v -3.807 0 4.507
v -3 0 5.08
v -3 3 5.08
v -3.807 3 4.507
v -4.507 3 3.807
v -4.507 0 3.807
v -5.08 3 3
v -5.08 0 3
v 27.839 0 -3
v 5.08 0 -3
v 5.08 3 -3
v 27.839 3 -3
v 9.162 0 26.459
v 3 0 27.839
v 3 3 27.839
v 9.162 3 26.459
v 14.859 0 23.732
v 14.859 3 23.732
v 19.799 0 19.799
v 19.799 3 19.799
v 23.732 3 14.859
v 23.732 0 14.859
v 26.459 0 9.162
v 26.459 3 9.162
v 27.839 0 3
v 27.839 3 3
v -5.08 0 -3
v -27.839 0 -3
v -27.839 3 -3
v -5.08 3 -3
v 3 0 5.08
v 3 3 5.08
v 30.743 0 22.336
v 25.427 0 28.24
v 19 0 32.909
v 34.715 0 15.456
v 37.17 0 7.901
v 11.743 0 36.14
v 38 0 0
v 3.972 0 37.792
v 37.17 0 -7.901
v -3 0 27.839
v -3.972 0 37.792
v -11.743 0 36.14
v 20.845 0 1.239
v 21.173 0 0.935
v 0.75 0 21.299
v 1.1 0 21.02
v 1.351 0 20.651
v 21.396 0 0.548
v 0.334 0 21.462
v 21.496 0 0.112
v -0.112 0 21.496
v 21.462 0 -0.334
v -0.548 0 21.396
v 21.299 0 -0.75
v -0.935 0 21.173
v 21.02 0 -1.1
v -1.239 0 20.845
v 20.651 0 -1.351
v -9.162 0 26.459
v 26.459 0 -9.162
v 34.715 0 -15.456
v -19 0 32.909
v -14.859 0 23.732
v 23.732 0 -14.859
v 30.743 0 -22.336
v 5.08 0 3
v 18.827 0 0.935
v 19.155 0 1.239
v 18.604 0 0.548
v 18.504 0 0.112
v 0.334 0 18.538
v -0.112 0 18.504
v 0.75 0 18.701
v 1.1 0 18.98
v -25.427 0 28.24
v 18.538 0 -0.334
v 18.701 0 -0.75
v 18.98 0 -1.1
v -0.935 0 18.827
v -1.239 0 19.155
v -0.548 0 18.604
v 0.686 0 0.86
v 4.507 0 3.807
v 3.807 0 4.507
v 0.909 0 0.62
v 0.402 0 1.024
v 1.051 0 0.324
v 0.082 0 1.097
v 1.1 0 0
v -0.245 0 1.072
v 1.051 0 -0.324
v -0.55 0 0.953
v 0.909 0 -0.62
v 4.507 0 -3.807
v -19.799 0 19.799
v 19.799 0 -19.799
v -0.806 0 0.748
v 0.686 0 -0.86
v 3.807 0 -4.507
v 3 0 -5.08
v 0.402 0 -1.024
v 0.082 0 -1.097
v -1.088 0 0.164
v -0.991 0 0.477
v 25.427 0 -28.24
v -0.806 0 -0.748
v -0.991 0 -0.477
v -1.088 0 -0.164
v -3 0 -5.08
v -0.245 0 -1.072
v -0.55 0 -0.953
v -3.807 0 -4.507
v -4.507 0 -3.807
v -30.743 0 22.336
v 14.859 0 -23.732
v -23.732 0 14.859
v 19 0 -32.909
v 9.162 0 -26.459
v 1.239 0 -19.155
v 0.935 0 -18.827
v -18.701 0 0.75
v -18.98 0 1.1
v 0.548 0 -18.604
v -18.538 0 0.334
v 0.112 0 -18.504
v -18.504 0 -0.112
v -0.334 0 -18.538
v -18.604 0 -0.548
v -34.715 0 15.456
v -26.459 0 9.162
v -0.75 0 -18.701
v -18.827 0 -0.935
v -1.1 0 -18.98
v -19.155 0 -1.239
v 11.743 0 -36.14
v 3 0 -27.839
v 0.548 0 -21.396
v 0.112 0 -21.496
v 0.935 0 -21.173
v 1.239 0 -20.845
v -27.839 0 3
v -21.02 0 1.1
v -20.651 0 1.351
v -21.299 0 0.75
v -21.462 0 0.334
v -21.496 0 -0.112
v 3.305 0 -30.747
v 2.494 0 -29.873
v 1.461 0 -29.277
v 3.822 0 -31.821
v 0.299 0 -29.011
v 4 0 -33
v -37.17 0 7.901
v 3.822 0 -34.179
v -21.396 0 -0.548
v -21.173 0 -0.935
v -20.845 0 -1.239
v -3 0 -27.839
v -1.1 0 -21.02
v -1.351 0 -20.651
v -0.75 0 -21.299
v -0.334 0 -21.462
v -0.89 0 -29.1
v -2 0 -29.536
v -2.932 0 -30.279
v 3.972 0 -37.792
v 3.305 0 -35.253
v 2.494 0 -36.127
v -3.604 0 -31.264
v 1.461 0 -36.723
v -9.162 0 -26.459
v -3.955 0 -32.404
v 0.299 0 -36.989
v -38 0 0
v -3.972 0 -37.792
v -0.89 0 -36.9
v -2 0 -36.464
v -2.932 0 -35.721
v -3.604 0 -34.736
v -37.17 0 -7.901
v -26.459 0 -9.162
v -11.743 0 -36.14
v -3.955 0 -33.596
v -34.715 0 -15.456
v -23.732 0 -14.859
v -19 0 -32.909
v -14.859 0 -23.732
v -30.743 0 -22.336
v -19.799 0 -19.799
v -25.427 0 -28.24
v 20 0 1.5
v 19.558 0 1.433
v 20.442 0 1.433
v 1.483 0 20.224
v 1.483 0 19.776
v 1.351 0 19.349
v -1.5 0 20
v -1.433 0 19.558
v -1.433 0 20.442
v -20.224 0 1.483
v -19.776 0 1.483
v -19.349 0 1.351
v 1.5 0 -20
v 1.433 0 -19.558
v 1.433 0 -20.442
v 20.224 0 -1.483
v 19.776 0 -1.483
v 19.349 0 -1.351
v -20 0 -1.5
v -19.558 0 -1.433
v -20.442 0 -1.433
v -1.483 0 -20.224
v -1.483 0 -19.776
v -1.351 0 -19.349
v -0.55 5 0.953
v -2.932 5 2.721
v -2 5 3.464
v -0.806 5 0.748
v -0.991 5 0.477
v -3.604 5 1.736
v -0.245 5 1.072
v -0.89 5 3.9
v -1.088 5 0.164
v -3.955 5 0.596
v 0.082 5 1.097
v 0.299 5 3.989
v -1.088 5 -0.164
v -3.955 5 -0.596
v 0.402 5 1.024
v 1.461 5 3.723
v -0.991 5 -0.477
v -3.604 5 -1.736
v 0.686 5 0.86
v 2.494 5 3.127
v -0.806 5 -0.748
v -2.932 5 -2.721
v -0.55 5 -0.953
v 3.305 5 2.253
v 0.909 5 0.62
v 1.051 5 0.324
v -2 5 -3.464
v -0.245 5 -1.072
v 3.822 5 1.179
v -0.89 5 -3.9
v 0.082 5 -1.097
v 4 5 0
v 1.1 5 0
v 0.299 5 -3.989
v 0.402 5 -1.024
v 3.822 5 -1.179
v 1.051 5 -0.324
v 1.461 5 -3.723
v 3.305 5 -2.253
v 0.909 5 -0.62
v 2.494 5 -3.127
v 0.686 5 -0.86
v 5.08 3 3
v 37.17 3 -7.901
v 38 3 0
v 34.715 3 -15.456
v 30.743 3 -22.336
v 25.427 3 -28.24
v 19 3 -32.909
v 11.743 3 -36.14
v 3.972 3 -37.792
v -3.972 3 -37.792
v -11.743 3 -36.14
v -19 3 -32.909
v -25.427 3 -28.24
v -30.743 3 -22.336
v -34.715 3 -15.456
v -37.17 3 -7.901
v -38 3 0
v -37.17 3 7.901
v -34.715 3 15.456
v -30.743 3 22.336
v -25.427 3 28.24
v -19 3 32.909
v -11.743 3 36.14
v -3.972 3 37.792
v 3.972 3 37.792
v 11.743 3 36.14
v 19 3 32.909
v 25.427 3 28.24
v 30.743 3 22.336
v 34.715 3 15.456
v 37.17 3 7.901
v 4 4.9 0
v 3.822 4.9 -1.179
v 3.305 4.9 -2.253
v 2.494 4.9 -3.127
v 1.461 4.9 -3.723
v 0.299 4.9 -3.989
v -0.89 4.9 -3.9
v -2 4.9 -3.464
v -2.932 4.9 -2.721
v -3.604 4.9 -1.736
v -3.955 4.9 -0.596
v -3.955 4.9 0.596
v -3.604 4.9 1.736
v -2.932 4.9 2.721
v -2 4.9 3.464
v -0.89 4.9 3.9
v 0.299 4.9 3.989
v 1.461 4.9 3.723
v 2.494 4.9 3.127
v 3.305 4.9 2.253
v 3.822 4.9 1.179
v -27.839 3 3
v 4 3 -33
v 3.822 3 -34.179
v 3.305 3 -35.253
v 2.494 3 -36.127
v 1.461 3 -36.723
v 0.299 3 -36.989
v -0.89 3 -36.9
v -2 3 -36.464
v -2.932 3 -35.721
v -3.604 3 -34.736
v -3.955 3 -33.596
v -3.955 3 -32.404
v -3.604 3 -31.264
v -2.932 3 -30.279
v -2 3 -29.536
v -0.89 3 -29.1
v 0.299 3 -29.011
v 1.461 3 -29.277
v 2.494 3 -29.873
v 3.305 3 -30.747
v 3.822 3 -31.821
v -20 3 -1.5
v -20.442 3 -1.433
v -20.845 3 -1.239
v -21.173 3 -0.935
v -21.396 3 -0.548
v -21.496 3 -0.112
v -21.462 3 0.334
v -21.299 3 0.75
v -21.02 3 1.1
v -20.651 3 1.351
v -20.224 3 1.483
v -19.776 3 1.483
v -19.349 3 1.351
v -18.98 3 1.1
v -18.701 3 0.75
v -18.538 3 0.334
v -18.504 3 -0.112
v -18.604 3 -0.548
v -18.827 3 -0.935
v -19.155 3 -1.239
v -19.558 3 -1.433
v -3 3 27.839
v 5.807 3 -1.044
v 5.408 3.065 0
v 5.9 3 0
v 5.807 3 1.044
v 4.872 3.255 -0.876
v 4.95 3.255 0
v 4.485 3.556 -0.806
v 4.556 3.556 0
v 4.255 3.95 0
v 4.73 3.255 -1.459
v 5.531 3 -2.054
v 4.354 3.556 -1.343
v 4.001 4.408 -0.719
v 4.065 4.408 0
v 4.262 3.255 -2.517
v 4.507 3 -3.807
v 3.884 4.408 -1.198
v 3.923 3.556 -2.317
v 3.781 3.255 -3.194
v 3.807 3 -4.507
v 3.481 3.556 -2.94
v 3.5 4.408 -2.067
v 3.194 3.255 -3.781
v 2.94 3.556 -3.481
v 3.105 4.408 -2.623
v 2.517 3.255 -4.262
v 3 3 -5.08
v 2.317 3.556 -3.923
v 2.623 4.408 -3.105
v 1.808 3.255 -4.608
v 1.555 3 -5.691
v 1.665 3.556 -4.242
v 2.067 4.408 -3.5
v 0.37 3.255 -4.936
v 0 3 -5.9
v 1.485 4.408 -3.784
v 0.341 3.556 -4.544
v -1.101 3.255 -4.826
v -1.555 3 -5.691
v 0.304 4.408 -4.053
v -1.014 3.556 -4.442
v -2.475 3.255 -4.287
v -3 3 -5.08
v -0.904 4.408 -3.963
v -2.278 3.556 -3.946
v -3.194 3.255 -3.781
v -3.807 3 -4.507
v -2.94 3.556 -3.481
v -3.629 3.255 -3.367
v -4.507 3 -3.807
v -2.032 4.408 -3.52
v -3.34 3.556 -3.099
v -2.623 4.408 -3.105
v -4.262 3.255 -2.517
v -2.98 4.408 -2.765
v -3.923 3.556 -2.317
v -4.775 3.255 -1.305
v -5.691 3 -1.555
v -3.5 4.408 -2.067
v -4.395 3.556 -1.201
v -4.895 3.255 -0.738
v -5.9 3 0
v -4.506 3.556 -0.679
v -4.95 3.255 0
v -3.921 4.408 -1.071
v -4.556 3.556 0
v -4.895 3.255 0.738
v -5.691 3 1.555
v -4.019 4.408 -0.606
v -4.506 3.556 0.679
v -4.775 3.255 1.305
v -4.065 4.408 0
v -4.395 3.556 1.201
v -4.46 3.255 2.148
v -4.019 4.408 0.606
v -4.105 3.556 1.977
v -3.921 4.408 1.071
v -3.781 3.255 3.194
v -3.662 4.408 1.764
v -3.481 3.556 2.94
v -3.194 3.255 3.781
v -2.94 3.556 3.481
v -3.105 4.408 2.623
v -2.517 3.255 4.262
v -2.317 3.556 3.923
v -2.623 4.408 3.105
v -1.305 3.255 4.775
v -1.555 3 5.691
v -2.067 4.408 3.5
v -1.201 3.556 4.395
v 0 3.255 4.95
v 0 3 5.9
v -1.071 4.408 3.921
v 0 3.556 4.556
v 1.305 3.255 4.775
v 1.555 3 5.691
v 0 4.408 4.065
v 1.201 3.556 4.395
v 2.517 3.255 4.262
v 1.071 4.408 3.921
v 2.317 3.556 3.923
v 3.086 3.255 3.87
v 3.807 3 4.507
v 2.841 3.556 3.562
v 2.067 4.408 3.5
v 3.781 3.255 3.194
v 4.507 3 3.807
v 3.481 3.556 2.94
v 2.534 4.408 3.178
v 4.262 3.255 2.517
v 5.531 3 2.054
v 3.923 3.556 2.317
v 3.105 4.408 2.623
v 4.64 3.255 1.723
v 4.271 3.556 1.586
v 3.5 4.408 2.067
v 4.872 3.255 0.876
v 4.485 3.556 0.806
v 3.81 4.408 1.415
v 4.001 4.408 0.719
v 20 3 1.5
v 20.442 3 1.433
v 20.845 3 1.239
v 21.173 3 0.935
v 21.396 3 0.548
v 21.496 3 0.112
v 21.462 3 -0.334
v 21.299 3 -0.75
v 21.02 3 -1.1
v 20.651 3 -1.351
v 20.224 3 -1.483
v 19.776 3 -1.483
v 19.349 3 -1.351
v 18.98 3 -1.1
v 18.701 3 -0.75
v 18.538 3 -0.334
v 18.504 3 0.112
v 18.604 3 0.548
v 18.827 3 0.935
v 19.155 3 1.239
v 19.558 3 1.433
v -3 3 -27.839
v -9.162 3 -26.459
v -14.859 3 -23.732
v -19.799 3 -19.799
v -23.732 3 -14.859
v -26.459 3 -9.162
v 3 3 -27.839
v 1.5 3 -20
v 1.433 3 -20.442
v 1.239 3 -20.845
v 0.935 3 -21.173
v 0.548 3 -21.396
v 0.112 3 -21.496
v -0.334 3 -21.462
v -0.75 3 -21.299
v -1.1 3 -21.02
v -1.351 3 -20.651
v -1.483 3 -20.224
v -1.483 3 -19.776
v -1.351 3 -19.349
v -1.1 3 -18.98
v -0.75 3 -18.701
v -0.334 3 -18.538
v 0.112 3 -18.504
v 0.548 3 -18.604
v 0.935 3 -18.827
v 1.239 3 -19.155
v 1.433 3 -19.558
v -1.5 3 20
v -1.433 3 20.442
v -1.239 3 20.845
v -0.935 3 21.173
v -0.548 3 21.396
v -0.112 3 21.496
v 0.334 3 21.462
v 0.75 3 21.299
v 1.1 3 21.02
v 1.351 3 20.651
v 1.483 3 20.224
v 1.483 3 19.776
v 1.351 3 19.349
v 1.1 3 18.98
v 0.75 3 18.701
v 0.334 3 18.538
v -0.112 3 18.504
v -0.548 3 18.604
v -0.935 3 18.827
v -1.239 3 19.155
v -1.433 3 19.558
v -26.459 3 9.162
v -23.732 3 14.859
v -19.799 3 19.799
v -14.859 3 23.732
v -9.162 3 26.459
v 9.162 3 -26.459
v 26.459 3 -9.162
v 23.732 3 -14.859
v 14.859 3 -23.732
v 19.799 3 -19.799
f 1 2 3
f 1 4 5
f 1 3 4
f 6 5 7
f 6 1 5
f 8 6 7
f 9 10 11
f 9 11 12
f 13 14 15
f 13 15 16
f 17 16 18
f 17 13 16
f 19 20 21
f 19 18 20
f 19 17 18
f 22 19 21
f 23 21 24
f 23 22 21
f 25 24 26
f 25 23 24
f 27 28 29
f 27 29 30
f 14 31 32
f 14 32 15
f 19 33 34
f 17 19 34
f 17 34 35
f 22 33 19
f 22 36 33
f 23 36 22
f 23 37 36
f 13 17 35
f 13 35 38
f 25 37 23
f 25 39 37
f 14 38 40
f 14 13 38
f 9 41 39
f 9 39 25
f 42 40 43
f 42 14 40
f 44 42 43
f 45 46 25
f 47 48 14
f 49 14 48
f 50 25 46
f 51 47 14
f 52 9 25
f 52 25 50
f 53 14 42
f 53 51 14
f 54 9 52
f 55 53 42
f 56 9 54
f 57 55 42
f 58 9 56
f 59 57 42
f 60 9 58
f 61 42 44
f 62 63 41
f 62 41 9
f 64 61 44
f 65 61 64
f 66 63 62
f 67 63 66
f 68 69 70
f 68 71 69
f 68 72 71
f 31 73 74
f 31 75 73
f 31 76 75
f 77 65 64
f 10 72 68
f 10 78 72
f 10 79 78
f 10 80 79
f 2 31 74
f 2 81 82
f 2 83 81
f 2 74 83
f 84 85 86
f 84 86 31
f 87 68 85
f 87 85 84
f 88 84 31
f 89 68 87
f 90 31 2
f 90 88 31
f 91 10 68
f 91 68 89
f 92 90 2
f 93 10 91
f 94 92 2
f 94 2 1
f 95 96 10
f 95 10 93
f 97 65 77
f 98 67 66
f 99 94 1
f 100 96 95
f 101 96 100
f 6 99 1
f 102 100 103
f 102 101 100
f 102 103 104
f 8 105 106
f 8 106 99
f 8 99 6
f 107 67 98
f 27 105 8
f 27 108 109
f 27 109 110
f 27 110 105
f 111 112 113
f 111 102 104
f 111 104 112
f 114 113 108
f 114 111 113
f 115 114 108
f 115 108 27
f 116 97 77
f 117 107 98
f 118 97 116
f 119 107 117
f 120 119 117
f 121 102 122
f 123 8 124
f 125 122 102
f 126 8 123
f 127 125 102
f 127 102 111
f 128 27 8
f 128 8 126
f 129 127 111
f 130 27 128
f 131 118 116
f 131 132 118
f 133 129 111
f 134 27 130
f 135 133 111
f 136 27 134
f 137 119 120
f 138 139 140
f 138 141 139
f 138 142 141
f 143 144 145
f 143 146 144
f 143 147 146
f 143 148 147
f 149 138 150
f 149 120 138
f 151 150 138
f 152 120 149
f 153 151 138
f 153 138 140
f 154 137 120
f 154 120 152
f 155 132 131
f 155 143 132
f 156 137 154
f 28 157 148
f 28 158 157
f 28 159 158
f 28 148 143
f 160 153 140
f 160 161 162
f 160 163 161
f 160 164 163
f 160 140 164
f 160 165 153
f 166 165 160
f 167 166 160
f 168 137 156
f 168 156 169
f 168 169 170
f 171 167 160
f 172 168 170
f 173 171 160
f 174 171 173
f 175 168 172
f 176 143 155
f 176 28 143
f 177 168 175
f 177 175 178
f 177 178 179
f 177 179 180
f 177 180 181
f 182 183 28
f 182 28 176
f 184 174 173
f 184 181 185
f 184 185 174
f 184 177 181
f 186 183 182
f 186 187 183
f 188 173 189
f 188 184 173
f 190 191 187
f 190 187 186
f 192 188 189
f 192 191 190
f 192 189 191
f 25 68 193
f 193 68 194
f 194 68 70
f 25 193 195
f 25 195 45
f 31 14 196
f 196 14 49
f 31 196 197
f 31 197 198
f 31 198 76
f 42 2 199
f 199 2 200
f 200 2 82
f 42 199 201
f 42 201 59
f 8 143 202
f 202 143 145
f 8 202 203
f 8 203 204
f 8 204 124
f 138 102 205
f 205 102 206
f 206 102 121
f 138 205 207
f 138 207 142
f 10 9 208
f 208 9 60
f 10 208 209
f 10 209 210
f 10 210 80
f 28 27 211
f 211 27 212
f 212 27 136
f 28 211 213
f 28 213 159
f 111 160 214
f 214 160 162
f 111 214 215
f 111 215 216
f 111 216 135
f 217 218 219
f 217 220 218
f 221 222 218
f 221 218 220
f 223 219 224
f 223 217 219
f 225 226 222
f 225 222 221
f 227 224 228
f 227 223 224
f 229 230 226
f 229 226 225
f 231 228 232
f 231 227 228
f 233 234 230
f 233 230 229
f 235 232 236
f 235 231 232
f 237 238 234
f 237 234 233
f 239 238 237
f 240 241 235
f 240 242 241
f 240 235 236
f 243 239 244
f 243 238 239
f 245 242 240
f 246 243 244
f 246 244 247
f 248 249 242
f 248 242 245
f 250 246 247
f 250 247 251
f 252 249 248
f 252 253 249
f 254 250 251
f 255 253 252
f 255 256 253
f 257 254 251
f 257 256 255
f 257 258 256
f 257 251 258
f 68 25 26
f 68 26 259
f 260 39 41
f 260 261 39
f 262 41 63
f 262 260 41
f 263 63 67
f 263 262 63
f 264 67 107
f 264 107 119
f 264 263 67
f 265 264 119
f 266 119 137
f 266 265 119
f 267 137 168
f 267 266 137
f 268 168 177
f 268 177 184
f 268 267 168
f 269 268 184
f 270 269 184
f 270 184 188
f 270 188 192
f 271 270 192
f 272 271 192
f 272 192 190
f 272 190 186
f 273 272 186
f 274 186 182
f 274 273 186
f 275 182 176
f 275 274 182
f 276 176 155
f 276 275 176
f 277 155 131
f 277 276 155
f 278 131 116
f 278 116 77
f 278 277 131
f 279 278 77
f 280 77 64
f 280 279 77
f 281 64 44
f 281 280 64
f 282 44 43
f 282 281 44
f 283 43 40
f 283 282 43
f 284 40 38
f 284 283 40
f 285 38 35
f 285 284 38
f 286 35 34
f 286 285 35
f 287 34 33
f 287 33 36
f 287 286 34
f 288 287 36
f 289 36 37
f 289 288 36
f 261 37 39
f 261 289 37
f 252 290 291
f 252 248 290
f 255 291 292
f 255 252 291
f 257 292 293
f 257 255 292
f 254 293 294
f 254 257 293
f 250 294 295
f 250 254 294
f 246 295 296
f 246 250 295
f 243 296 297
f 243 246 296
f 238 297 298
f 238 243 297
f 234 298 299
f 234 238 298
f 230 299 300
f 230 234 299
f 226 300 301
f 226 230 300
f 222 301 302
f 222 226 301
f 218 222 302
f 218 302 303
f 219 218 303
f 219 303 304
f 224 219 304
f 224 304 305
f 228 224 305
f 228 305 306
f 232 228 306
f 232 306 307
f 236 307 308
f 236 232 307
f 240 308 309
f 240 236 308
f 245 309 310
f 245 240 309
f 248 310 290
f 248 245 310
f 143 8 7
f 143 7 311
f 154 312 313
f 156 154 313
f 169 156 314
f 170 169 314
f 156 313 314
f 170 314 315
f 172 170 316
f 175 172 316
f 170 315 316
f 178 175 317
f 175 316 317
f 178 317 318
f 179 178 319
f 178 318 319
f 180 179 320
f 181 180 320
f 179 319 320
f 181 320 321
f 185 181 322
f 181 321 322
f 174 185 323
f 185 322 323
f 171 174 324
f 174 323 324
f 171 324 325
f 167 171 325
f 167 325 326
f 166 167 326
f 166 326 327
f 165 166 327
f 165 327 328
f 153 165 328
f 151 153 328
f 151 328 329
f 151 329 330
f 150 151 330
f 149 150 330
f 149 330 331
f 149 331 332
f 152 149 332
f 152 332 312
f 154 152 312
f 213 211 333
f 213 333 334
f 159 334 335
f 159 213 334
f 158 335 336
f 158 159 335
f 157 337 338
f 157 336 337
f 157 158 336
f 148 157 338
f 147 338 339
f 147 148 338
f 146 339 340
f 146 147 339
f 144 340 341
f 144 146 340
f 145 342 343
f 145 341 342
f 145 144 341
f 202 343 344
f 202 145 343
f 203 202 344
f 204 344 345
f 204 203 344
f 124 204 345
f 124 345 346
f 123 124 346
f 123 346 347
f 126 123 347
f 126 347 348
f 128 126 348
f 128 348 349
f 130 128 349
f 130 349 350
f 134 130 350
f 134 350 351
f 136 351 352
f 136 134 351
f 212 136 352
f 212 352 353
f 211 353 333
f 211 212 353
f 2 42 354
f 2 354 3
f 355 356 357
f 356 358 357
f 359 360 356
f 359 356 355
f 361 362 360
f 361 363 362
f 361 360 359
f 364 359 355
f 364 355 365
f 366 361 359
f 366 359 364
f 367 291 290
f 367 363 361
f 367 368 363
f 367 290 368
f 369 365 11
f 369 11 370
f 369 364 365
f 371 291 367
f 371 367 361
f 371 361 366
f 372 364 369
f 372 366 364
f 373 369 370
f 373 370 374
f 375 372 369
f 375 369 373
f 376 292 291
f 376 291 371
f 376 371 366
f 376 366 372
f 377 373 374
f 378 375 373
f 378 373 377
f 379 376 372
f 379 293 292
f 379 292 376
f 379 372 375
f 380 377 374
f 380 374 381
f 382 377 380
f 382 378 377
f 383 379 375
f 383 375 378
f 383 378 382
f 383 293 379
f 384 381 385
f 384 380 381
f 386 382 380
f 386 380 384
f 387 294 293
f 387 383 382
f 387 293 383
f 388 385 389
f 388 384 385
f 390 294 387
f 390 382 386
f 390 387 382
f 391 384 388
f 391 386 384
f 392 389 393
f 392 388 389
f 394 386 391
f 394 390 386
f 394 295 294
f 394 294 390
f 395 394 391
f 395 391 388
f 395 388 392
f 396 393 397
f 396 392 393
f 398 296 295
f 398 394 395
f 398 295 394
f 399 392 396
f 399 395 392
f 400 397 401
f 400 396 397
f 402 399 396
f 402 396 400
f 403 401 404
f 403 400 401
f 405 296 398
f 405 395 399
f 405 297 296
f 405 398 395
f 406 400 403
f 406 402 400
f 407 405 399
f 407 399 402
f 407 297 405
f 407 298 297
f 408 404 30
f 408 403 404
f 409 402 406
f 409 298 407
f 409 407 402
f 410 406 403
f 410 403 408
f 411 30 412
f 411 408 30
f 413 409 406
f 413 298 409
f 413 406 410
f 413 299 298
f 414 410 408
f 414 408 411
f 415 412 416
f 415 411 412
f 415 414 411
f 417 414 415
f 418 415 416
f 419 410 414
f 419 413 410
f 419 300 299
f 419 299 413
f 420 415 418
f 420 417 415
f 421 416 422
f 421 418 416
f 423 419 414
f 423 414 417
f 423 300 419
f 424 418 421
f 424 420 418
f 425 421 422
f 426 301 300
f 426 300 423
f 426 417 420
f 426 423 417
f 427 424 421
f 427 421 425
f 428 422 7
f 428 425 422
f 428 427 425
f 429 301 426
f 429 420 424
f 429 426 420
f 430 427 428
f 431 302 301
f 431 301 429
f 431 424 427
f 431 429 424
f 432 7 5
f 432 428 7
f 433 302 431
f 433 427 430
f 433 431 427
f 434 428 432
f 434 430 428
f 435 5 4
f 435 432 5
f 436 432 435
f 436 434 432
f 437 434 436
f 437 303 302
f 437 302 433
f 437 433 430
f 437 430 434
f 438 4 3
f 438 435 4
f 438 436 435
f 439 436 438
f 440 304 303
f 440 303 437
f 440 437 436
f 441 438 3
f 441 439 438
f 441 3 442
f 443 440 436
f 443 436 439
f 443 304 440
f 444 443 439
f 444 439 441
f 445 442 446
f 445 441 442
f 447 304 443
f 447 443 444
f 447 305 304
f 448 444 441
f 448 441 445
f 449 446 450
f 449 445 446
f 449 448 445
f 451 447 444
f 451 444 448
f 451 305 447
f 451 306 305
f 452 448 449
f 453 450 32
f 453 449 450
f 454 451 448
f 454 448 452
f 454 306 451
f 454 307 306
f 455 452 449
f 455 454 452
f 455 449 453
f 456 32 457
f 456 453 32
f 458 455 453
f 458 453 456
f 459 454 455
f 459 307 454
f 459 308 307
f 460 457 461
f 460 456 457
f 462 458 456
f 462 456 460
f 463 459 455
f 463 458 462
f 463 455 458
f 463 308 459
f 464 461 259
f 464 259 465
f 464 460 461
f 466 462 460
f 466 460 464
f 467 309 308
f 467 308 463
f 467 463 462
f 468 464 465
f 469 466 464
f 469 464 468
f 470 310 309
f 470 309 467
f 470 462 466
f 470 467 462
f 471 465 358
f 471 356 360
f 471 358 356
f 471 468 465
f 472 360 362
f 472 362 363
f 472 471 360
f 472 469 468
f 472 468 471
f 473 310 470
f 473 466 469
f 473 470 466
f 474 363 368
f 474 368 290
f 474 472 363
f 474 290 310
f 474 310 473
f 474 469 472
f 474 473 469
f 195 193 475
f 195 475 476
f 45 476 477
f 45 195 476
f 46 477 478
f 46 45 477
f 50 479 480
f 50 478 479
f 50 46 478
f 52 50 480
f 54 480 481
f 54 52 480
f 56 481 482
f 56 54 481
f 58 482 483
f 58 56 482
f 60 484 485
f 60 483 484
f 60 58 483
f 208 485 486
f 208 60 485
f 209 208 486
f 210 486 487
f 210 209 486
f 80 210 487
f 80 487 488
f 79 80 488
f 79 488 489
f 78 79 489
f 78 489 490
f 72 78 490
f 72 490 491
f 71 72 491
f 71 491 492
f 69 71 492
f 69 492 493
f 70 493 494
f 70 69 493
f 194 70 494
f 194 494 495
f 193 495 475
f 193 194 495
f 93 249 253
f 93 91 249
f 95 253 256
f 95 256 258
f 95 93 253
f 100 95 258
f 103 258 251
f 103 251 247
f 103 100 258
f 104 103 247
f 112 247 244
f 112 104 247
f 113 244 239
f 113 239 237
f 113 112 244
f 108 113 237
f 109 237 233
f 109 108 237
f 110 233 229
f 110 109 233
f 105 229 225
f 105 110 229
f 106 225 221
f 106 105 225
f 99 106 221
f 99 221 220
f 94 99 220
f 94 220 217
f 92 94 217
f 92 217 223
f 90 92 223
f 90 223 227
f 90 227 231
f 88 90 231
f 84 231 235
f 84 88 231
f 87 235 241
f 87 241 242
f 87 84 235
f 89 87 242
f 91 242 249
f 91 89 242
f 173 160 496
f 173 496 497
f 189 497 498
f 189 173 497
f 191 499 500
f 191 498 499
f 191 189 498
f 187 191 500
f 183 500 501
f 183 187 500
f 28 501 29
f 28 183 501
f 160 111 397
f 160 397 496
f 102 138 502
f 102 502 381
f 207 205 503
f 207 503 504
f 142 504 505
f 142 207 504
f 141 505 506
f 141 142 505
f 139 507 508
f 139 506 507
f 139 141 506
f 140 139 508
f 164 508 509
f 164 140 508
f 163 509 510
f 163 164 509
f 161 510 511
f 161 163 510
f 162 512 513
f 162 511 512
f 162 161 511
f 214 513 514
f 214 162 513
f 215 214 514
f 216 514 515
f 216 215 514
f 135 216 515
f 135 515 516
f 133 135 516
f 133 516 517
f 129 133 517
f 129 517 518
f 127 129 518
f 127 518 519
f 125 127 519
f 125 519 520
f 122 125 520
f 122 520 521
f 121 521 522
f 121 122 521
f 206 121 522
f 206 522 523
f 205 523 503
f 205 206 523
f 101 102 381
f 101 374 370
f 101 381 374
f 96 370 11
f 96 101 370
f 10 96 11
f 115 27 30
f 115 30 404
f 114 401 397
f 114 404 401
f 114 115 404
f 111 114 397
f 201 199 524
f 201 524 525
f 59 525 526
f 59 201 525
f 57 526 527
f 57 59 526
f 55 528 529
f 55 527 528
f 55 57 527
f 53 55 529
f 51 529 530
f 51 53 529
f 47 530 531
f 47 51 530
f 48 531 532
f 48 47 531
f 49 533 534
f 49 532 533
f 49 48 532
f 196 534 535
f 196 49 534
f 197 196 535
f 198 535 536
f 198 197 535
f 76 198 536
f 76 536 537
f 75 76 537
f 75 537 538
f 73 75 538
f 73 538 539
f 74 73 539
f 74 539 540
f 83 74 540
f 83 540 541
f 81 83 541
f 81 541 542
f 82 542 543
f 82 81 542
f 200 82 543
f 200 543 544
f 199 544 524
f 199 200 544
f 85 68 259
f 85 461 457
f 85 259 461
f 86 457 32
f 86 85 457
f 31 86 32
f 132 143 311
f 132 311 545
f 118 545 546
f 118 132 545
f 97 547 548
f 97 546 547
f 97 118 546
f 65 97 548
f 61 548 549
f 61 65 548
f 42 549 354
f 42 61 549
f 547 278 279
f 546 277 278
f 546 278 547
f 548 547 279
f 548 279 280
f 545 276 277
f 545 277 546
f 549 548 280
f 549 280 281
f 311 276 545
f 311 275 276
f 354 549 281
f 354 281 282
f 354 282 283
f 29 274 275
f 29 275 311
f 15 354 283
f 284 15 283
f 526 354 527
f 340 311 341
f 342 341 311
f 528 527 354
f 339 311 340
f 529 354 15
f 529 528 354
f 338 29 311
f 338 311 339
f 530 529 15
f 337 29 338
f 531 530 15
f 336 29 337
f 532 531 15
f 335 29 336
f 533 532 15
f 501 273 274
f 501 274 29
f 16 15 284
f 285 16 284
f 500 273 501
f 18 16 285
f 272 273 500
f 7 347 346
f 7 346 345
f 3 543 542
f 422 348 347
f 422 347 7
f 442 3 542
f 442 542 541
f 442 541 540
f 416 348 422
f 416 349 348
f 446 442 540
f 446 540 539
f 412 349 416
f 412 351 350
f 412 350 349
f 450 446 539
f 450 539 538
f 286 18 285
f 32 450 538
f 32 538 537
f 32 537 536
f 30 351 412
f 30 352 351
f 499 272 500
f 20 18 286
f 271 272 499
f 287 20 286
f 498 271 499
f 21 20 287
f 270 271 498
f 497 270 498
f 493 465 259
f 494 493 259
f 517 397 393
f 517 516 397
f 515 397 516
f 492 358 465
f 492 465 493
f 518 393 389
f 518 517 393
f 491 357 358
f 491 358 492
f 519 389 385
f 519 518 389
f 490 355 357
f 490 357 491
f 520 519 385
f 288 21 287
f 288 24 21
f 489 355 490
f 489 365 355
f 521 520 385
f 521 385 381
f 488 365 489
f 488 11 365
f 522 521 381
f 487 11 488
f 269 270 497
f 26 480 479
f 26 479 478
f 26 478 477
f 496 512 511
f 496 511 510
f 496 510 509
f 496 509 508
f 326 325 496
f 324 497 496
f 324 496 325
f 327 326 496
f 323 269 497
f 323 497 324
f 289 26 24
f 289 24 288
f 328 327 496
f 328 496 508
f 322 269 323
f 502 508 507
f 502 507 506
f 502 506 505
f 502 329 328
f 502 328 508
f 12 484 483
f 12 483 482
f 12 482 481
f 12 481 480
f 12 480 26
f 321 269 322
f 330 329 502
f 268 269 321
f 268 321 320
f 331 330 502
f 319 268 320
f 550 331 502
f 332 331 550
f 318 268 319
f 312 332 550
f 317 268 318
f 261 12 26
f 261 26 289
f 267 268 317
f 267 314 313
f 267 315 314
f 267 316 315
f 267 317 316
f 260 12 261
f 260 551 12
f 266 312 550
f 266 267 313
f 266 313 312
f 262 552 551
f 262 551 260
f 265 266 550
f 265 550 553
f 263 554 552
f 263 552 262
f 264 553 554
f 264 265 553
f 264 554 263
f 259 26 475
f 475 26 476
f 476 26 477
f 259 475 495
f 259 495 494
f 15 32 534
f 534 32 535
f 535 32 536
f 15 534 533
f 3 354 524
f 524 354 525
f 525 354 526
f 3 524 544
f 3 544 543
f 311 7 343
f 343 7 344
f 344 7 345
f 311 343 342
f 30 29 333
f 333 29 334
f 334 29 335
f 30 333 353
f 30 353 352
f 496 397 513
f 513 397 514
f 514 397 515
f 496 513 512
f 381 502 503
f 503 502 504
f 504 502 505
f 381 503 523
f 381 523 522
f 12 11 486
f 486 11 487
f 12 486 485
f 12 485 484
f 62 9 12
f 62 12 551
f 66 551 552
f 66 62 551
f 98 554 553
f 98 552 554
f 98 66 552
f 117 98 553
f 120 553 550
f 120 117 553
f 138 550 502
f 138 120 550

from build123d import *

# Parameters (mm, degrees)
CORTE_EXTRUS_O4_START  = -1
ESBO_O2_R              = 1.5
CORTE_EXTRUS_O4_DEPTH  = 7
CORTE_EXTRUS_O9_START  = -4
CORTE_EXTRUS_O9_DEPTH  = 7
PADR_OCIRCULAR1_COUNT  = 4
ESBO_O7_R              = 4
CORTE_EXTRUS_O10_DEPTH = 10


with BuildPart() as part:
    # Esboço1 → Revolução1 (revolve)
    with BuildSketch(Plane.XY):
        with BuildLine():
            Line((1.1, 5), (1.1, 0))
            Line((1.1, 0), (38, 0))
            Line((38, 0), (38, 3))
            Line((38, 3), (5.9, 3))
            ThreePointArc((5.9, 3), (4.556497116, 3.556497116), (4, 4.9))
            Line((4, 4.9), (4, 5))
            Line((4, 5), (1.1, 5))
        make_face()
    revolve(axis=Axis((0, 0, 0), (0, 1, 0)))

    # Esboço2 → Corte-extrusão4 (cut)
    with BuildSketch(Plane(origin=(0, 0, 0), x_dir=(1, 0, 0), z_dir=(0, 1, 0)).offset(CORTE_EXTRUS_O4_START)):
        with Locations((0, 20)):
            Circle(ESBO_O2_R)
    corte_extrus_o4 = extrude(amount=CORTE_EXTRUS_O4_DEPTH, mode=Mode.SUBTRACT)

    # Esboço6 → Corte-extrusão9 (cut)
    with BuildSketch(Plane(origin=(0, 3, 0), x_dir=(1, 0, 0), z_dir=(0, 1, 0)).offset(CORTE_EXTRUS_O9_START)):
        with BuildLine():
            Line((3, 27.838821814), (3, 5.080354318))
            ThreePointArc((3, 5.080354318), (4.171930009, 4.171930009), (5.080354318, 3))
            Line((5.080354318, 3), (27.838821814, 3))
            ThreePointArc((27.838821814, 3), (19.798989873, 19.798989873), (3, 27.838821814))
        make_face()
    corte_extrus_o9 = extrude(amount=CORTE_EXTRUS_O9_DEPTH, mode=Mode.SUBTRACT)

    # PadrãoCircular1: Corte-extrusão4, Corte-extrusão9 ×4 about axis
    padr_ocircular1_axis = Axis((0, 0, 0), (0, 1, 0))
    for i in range(1, PADR_OCIRCULAR1_COUNT):
        add(corte_extrus_o4.rotate(padr_ocircular1_axis, i * 360 / PADR_OCIRCULAR1_COUNT), mode=Mode.SUBTRACT)
        add(corte_extrus_o9.rotate(padr_ocircular1_axis, i * 360 / PADR_OCIRCULAR1_COUNT), mode=Mode.SUBTRACT)

    # Esboço7 → Corte-extrusão10 (cut)
    with BuildSketch(Plane(origin=(0, 3, 0), x_dir=(1, 0, 0), z_dir=(0, 1, 0))):
        with Locations((0, 33)):
            Circle(ESBO_O7_R)
    extrude(amount=-CORTE_EXTRUS_O10_DEPTH, mode=Mode.SUBTRACT)


solid = part.part
